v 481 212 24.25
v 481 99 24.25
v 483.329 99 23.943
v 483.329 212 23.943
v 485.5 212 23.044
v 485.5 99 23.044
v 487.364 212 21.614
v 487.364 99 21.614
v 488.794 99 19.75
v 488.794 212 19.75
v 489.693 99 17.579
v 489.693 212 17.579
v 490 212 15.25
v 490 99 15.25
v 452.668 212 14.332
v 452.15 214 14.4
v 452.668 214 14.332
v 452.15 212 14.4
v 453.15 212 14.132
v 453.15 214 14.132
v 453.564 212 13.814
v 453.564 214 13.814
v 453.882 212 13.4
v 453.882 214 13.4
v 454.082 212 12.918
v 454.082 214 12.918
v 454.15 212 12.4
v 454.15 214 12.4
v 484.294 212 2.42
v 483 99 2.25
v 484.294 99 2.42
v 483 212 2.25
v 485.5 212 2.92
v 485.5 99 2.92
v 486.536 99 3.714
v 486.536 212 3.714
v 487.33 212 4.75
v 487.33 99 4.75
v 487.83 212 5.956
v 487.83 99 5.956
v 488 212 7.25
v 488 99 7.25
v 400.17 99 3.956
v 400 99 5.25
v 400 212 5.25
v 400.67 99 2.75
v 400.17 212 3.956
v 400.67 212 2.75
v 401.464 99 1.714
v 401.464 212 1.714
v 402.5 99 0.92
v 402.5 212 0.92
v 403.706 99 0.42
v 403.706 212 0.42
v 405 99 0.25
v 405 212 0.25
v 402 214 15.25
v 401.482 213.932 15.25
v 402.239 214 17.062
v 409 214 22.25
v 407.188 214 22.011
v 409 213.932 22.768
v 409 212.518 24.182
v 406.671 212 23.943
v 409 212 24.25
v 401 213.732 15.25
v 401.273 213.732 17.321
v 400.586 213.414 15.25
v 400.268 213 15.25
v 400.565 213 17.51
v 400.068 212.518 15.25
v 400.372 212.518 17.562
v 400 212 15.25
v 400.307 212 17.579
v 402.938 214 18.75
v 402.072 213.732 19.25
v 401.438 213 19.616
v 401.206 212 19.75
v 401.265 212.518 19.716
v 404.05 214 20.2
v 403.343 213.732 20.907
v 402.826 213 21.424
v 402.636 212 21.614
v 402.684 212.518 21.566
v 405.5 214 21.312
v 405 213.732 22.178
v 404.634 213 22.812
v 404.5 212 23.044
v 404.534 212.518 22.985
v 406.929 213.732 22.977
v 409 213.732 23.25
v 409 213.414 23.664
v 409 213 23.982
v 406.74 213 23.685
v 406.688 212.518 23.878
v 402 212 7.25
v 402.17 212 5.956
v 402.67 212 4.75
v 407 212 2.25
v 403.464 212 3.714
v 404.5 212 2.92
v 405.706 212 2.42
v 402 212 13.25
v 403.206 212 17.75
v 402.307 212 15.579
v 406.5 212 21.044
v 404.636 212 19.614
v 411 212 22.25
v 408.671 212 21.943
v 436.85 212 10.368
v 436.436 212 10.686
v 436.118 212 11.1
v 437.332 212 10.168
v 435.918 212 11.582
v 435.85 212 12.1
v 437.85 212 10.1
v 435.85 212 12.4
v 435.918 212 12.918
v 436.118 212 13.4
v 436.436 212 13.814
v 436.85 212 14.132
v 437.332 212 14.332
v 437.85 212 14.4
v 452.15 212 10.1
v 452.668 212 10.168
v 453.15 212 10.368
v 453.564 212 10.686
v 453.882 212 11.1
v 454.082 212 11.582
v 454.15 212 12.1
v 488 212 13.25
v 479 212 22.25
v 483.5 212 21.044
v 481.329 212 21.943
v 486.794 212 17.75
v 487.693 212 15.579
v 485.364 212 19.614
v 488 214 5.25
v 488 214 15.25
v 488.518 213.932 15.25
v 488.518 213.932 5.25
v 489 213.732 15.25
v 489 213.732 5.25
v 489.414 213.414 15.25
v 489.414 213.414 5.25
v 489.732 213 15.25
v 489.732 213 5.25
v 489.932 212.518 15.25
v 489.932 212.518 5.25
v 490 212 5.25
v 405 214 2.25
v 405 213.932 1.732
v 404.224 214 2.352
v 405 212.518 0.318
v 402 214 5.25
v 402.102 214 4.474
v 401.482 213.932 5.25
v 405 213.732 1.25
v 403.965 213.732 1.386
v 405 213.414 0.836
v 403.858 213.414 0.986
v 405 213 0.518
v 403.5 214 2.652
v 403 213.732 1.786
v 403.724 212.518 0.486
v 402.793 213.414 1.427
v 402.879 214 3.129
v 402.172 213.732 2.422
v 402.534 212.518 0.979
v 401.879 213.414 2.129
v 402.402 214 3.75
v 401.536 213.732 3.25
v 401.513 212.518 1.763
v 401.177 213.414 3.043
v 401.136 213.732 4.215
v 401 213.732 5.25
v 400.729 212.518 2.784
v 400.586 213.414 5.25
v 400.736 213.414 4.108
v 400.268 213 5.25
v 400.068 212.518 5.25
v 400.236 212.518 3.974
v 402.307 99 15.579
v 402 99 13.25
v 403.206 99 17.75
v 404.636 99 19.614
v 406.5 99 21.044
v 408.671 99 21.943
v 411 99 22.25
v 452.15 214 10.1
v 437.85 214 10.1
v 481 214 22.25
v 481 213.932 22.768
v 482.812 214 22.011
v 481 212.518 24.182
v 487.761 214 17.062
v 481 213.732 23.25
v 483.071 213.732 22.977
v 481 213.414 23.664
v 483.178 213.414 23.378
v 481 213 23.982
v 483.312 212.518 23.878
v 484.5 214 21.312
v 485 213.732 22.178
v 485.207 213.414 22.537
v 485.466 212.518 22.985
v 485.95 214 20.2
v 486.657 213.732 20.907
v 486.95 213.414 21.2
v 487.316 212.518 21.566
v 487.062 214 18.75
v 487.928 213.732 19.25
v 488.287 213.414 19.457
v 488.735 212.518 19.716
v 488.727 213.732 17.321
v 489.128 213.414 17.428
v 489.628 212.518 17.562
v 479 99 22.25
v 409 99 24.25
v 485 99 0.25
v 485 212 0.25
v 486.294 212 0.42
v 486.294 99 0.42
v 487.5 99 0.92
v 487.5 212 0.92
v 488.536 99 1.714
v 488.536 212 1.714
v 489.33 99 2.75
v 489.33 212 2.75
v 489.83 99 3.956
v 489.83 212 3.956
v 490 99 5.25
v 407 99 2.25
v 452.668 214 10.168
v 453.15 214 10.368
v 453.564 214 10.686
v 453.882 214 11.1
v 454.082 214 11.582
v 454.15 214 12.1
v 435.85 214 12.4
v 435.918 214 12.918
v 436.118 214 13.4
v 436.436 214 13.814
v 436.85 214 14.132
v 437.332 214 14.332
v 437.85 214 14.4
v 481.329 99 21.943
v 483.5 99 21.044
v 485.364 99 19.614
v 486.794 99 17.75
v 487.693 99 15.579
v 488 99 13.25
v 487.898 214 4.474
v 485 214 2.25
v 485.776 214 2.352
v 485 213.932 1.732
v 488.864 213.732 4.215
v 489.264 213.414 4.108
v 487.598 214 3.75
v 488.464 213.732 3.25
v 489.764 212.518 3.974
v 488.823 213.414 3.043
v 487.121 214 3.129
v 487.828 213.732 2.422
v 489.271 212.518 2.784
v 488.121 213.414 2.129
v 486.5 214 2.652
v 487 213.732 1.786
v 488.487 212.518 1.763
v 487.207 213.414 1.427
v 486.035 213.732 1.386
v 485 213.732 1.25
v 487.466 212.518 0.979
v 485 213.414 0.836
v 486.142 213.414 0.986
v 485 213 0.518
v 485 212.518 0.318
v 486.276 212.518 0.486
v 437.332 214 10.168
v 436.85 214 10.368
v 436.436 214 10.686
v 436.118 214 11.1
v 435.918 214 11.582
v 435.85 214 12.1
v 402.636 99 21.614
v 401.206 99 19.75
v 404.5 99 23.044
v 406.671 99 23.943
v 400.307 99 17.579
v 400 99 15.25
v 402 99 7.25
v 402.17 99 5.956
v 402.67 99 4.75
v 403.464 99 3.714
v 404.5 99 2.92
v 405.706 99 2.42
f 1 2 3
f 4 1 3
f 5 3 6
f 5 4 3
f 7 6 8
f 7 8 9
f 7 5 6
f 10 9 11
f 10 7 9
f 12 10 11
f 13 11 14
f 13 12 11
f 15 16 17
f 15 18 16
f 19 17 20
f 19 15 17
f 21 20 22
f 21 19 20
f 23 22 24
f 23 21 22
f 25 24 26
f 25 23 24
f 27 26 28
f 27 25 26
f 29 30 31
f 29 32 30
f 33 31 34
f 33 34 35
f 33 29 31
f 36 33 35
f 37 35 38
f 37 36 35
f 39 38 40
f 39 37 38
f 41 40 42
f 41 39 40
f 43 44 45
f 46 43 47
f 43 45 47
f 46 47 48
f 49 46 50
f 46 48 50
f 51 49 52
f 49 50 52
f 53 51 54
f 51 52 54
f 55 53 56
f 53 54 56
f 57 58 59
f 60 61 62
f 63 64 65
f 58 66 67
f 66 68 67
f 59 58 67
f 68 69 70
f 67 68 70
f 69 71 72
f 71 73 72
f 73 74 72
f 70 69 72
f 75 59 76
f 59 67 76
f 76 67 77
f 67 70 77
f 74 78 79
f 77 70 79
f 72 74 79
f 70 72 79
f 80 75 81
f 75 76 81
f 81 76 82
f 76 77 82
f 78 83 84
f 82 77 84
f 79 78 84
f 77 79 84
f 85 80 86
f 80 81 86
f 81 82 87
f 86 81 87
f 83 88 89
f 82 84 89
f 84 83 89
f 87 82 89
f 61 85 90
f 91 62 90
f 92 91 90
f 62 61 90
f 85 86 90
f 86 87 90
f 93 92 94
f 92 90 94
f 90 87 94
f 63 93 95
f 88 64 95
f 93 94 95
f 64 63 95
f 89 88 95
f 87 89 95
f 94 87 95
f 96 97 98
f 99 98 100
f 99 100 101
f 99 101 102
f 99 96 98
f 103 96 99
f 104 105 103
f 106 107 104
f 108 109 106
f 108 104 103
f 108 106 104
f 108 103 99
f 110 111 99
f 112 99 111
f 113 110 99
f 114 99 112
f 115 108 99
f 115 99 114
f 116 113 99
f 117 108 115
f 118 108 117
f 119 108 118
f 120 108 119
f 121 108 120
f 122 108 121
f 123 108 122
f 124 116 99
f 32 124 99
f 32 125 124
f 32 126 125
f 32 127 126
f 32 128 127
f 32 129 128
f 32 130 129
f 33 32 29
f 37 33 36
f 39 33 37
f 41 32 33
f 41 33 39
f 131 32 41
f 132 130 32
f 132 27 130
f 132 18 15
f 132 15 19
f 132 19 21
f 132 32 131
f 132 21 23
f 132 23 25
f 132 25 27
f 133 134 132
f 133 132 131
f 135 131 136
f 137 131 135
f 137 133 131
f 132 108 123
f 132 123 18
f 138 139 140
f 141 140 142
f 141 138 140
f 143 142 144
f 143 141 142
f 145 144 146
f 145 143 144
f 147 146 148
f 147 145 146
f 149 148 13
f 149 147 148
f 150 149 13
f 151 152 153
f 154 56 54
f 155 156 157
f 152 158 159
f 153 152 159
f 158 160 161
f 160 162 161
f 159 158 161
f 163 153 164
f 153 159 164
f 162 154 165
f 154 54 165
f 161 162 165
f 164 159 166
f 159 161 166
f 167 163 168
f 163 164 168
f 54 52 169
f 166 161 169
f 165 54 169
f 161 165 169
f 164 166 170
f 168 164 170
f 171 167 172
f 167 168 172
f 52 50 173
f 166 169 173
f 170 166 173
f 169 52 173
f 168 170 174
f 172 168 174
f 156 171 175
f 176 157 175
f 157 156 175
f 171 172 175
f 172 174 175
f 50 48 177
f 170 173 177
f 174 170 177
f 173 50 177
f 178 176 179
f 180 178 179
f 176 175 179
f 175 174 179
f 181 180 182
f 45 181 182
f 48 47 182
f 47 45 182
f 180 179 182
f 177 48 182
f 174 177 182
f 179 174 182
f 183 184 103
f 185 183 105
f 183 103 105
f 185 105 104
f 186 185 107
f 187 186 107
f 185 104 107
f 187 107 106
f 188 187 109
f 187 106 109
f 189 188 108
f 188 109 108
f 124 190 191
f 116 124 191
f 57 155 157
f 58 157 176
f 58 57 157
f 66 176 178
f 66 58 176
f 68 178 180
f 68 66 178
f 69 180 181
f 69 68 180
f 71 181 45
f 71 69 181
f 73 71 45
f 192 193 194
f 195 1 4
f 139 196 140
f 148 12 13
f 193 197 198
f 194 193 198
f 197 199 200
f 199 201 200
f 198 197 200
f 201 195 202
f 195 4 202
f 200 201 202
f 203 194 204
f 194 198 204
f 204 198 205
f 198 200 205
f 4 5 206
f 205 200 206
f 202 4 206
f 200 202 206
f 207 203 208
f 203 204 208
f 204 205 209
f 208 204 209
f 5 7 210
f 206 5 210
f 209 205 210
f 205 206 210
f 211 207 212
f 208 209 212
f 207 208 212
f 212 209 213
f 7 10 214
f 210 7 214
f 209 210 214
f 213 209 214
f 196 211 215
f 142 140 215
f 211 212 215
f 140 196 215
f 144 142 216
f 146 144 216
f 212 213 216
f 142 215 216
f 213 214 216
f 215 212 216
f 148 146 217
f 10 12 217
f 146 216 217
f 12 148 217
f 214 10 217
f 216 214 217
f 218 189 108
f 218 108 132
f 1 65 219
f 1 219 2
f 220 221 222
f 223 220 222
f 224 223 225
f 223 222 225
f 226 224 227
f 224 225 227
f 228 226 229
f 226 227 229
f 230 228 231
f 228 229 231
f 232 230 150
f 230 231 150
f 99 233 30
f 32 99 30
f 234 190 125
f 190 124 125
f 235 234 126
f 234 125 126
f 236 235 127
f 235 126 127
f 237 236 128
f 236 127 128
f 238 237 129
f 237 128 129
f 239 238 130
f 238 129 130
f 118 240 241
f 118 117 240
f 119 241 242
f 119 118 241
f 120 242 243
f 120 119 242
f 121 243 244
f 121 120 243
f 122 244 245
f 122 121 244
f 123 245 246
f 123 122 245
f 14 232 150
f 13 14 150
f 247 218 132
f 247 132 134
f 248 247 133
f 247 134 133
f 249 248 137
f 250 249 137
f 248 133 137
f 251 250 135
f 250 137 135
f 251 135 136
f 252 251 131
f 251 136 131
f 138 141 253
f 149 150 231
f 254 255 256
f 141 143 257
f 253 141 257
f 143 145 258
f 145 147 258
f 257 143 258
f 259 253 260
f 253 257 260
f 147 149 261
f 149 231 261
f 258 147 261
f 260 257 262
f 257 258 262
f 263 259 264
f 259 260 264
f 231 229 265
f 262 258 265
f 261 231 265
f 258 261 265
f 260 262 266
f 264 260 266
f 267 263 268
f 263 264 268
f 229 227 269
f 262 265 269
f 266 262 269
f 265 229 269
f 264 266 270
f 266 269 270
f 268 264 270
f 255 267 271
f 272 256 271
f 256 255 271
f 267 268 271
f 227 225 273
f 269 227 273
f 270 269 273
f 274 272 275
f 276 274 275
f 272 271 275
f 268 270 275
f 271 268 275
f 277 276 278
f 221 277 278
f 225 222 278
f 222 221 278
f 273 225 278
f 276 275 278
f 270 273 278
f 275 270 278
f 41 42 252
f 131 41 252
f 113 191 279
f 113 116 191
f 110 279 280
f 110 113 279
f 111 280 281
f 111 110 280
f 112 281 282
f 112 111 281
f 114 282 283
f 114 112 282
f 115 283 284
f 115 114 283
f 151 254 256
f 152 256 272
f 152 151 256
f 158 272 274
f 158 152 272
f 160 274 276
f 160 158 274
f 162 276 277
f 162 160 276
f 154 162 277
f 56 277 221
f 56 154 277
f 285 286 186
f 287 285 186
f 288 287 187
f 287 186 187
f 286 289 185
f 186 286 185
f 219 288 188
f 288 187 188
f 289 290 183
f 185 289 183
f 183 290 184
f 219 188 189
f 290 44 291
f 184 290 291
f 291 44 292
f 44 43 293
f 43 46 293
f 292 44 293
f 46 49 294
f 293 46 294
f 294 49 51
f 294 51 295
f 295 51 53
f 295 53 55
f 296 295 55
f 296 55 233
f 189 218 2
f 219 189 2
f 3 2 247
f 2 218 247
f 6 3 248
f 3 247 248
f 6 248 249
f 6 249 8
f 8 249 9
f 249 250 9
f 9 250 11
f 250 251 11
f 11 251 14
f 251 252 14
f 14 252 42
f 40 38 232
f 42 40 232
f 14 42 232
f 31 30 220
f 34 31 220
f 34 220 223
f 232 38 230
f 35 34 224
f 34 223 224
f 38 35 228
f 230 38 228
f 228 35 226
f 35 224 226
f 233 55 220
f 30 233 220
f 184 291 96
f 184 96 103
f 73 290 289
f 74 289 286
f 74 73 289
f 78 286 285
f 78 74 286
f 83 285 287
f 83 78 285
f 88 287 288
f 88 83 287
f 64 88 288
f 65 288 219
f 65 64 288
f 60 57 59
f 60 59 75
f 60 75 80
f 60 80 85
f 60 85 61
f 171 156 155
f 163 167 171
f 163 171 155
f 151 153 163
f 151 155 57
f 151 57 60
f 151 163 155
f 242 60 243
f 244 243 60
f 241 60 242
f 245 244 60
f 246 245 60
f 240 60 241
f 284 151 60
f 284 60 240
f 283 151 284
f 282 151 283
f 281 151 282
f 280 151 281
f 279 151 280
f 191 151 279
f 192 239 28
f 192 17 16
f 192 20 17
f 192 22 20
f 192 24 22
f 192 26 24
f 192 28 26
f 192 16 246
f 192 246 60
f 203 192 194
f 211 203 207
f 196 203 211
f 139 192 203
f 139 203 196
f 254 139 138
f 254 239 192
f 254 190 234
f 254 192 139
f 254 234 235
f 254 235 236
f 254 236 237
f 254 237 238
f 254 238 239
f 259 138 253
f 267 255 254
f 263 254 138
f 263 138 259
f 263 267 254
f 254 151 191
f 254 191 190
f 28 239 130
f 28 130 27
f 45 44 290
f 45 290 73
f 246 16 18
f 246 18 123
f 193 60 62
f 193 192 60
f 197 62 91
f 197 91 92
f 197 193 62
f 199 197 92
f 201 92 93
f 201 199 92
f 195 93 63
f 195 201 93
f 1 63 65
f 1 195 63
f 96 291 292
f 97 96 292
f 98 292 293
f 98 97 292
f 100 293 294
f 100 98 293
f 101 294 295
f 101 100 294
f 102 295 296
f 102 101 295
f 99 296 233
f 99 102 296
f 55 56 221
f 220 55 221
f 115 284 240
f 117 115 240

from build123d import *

# Parameters (mm, degrees)
SKETCH_W        = 90
SKETCH_H        = 115
PAD_DEPTH       = 24
SKETCH137_W     = 85.999994
SKETCH137_H     = 20
POCKET_DEPTH    = 113
FILLET_R        = 9
FILLET001_R     = 5
FILLET002_R     = 2
SKETCH143_W     = 18.3
SKETCH143_H     = 4.3
POCKET027_DEPTH = 2
FILLET004_R     = 2


with BuildPart() as part:
    # Sketch → Pad (new body)
    with BuildSketch(Plane.XY):
        with Locations((445, 157.5)):
            Rectangle(SKETCH_W, SKETCH_H)
    extrude(amount=PAD_DEPTH)

    # Sketch137 (on Face1 of Pad) → Pocket (cut)
    with BuildSketch(Plane.XZ.offset(-100)):
        with Locations((445.000003, 12)):
            Rectangle(SKETCH137_W, SKETCH137_H)
    extrude(amount=-POCKET_DEPTH, mode=Mode.SUBTRACT)

    # Fillet
    fillet_edges = [part.edges().sort_by_distance(p)[0] for p in [
        (490, 157.5, 24),
        (488, 156.5, 22),
        (402.000006, 156.5, 22),
        (400, 157.5, 24),
    ]]
    fillet(fillet_edges, radius=FILLET_R)

    # Fillet001
    fillet001_edges = [part.edges().sort_by_distance(p)[0] for p in [
        (402.000006, 156.5, 2),
        (490, 157.5, 0),
        (488, 156.5, 2),
        (400, 157.5, 0),
    ]]
    fillet(fillet001_edges, radius=FILLET001_R)

    # Fillet002
    fillet002_edges = [part.edges().sort_by_distance(p)[0] for p in [
        (445, 215, 24),
        (402.636039, 215, 21.363961),
        (400, 215, 10),
    ]]
    fillet(fillet002_edges, radius=FILLET002_R)

    # Sketch143 (on Face9 of Fillet002) → Pocket027 (cut)
    with BuildSketch(Plane(origin=(0, 215, 0), x_dir=(-1, 0, 0), z_dir=(0, 1, 0))):
        with Locations((-445, 12)):
            Rectangle(SKETCH143_W, SKETCH143_H)
    extrude(amount=-POCKET027_DEPTH, mode=Mode.SUBTRACT)

    # Fillet004
    fillet004_edges = [part.edges().sort_by_distance(p)[0] for p in [
        (435.85, 214, 9.85),
        (435.85, 214, 14.15),
        (454.15, 214, 9.85),
        (454.15, 214, 14.15),
    ]]
    fillet(fillet004_edges, radius=FILLET004_R)


with BuildPart() as part_1:
    # Body placement: moved
    add(part.part.moved(Location((0, -1, 0.25))))


solid = part_1.part
